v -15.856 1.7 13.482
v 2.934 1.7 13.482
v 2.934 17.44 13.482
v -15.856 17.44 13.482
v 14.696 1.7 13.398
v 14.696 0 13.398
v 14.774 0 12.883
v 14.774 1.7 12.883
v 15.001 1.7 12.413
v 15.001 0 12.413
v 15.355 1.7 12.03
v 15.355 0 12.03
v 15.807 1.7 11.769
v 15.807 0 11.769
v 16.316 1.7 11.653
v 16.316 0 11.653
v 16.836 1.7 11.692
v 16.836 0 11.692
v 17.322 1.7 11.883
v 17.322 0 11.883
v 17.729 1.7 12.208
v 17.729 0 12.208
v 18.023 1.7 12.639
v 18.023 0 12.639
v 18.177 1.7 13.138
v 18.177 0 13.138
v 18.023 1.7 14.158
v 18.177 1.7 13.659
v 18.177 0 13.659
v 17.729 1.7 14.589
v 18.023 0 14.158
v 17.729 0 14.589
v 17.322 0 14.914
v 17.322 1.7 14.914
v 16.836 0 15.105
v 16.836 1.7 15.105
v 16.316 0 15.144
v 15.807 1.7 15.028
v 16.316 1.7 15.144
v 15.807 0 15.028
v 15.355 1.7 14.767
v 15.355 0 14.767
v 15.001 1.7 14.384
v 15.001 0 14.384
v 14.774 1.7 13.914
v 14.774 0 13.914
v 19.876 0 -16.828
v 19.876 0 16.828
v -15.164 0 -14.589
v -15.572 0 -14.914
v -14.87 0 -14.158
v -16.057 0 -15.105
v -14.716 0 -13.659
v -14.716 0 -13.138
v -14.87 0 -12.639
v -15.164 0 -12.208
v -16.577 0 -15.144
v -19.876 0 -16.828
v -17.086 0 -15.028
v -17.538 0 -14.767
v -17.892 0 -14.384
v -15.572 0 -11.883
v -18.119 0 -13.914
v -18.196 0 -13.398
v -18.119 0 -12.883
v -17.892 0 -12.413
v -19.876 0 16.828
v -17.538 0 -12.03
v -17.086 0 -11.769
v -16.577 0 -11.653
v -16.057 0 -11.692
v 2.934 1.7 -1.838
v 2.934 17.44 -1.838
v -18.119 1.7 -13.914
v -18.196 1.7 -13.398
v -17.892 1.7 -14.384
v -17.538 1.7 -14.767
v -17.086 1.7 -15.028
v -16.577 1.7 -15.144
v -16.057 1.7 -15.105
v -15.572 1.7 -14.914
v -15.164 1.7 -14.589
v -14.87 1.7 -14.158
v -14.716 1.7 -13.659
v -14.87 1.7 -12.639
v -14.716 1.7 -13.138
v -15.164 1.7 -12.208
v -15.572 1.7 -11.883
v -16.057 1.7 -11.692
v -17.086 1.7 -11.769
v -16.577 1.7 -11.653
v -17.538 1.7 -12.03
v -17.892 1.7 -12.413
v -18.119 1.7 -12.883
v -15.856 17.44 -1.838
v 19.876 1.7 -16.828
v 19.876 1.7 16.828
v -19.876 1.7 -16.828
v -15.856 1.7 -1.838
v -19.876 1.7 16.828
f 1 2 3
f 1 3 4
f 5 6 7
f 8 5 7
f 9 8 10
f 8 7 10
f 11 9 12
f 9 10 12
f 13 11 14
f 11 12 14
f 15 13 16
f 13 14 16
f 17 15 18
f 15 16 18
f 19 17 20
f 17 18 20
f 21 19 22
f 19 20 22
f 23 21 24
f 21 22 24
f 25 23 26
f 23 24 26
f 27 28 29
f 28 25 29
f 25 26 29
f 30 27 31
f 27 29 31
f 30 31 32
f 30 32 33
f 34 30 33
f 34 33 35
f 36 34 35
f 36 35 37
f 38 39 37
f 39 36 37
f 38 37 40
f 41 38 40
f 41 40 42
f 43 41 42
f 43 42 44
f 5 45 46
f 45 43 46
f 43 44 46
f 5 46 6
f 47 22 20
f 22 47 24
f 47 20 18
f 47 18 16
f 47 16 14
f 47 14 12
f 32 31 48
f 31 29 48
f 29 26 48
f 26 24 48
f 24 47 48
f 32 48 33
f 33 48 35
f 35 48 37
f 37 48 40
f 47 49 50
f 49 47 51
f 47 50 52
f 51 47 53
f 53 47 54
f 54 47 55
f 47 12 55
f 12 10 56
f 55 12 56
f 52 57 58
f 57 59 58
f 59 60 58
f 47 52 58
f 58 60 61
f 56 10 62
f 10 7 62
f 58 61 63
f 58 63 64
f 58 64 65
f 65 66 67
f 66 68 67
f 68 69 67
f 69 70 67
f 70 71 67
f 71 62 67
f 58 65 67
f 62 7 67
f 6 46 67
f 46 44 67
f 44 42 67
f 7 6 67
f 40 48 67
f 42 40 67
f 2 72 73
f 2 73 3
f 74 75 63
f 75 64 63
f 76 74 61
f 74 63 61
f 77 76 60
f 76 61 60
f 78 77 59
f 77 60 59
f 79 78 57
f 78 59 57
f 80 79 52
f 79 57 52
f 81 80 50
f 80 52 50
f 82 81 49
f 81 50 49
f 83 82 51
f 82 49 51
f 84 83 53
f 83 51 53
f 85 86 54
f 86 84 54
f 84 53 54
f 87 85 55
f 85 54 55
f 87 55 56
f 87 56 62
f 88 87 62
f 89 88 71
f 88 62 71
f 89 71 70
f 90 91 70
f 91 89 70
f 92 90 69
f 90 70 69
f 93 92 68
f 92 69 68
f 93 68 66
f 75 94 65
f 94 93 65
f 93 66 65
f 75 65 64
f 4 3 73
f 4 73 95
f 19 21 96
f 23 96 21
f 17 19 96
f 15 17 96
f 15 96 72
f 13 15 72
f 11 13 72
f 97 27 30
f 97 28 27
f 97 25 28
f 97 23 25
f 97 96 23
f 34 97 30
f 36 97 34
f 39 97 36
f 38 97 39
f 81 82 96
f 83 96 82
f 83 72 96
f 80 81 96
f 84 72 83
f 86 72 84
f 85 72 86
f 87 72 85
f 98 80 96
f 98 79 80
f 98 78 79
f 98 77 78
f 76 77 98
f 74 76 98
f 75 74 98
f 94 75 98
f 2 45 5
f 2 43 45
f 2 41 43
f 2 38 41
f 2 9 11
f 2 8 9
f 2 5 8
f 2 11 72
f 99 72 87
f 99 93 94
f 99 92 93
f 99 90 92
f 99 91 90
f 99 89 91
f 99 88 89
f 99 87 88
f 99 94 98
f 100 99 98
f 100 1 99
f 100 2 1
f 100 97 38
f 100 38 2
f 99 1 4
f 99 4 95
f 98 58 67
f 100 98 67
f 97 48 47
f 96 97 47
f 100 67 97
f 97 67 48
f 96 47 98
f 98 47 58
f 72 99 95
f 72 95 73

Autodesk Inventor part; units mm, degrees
ref_plane "YZ Plane" through (0, 0, 0) normal (1, 0, 0) x (0, 1, 0)
ref_plane "XZ Plane" through (0, 0, 0) normal (0, 1, 0) x (-1, 0, 0)
ref_plane "XY Plane" through (0, 0, 0) normal (0, 0, 1) x (1, 0, 0)
sketch "Sketch1" plane through (0, 0, 0) normal (0, 1, 0) x (-1, 0, 0)
  line L0 (19.8755, 16.8275) -> (-19.8755, 16.8275)
  line L1 (-19.8755, 16.8275) -> (-19.8755, -16.8275)
  line L2 (-19.8755, -16.8275) -> (19.8755, -16.8275)
  line L3 (19.8755, -16.8275) -> (19.8755, 16.8275)
  line L4 (19.8755, 16.8275) -> (-19.8755, -16.8275) construction
  line L5 (-19.8755, 16.8275) -> (19.8755, -16.8275) construction
  circle A0 centre (16.4465, -13.3985) radius 1.75
  circle A1 centre (-16.4465, 13.3985) radius 1.75
  line L6 (15.8555, -1.8383) -> (-2.9345, -1.8383)
  line L7 (-2.9345, -1.8383) -> (-2.9345, 13.4817)
  line L8 (-2.9345, 13.4817) -> (15.8555, 13.4817)
  line L9 (15.8555, 13.4817) -> (15.8555, -1.8383)
  point P0 (0, 0)
  dimension "d0" = 39.751
  dimension "d1" = 33.655
  dimension "d2" = 3.5
  dimension "d3" = 3.5
  dimension "d4" = 3.429
  dimension "d5" = 3.429
  dimension "d6" = 3.429
  dimension "d7" = 3.429
  dimension "d8" = 18.79
  dimension "d9" = 15.32
  dimension "d10" = 24.2439
  dimension "d11" = 24.2439
extrude "Extrusion1" add sketch "Sketch1" along normal blind 1.7
extrude "Extrusion2" add sketch "Sketch1" along normal blind 17.44 contours L6 L7 L8 L9
sketch "Sketch2" plane through (0, 1.7, 0) normal (0, 1, 0) x (1, 0, 0)
  line L0 (-18.4674, 8.6665) -> (19.4938, 8.6665) construction
  line L1 (19.4938, 8.6665) -> (19.4938, 5.0304) construction
  line L2 (19.4938, 5.0304) -> (-18.4674, 5.0304) construction
  line L3 (-18.4674, 5.0304) -> (-18.4674, 8.6665) construction
  point P0 (0, 0)
properties part number "Driver Kipas v2"
